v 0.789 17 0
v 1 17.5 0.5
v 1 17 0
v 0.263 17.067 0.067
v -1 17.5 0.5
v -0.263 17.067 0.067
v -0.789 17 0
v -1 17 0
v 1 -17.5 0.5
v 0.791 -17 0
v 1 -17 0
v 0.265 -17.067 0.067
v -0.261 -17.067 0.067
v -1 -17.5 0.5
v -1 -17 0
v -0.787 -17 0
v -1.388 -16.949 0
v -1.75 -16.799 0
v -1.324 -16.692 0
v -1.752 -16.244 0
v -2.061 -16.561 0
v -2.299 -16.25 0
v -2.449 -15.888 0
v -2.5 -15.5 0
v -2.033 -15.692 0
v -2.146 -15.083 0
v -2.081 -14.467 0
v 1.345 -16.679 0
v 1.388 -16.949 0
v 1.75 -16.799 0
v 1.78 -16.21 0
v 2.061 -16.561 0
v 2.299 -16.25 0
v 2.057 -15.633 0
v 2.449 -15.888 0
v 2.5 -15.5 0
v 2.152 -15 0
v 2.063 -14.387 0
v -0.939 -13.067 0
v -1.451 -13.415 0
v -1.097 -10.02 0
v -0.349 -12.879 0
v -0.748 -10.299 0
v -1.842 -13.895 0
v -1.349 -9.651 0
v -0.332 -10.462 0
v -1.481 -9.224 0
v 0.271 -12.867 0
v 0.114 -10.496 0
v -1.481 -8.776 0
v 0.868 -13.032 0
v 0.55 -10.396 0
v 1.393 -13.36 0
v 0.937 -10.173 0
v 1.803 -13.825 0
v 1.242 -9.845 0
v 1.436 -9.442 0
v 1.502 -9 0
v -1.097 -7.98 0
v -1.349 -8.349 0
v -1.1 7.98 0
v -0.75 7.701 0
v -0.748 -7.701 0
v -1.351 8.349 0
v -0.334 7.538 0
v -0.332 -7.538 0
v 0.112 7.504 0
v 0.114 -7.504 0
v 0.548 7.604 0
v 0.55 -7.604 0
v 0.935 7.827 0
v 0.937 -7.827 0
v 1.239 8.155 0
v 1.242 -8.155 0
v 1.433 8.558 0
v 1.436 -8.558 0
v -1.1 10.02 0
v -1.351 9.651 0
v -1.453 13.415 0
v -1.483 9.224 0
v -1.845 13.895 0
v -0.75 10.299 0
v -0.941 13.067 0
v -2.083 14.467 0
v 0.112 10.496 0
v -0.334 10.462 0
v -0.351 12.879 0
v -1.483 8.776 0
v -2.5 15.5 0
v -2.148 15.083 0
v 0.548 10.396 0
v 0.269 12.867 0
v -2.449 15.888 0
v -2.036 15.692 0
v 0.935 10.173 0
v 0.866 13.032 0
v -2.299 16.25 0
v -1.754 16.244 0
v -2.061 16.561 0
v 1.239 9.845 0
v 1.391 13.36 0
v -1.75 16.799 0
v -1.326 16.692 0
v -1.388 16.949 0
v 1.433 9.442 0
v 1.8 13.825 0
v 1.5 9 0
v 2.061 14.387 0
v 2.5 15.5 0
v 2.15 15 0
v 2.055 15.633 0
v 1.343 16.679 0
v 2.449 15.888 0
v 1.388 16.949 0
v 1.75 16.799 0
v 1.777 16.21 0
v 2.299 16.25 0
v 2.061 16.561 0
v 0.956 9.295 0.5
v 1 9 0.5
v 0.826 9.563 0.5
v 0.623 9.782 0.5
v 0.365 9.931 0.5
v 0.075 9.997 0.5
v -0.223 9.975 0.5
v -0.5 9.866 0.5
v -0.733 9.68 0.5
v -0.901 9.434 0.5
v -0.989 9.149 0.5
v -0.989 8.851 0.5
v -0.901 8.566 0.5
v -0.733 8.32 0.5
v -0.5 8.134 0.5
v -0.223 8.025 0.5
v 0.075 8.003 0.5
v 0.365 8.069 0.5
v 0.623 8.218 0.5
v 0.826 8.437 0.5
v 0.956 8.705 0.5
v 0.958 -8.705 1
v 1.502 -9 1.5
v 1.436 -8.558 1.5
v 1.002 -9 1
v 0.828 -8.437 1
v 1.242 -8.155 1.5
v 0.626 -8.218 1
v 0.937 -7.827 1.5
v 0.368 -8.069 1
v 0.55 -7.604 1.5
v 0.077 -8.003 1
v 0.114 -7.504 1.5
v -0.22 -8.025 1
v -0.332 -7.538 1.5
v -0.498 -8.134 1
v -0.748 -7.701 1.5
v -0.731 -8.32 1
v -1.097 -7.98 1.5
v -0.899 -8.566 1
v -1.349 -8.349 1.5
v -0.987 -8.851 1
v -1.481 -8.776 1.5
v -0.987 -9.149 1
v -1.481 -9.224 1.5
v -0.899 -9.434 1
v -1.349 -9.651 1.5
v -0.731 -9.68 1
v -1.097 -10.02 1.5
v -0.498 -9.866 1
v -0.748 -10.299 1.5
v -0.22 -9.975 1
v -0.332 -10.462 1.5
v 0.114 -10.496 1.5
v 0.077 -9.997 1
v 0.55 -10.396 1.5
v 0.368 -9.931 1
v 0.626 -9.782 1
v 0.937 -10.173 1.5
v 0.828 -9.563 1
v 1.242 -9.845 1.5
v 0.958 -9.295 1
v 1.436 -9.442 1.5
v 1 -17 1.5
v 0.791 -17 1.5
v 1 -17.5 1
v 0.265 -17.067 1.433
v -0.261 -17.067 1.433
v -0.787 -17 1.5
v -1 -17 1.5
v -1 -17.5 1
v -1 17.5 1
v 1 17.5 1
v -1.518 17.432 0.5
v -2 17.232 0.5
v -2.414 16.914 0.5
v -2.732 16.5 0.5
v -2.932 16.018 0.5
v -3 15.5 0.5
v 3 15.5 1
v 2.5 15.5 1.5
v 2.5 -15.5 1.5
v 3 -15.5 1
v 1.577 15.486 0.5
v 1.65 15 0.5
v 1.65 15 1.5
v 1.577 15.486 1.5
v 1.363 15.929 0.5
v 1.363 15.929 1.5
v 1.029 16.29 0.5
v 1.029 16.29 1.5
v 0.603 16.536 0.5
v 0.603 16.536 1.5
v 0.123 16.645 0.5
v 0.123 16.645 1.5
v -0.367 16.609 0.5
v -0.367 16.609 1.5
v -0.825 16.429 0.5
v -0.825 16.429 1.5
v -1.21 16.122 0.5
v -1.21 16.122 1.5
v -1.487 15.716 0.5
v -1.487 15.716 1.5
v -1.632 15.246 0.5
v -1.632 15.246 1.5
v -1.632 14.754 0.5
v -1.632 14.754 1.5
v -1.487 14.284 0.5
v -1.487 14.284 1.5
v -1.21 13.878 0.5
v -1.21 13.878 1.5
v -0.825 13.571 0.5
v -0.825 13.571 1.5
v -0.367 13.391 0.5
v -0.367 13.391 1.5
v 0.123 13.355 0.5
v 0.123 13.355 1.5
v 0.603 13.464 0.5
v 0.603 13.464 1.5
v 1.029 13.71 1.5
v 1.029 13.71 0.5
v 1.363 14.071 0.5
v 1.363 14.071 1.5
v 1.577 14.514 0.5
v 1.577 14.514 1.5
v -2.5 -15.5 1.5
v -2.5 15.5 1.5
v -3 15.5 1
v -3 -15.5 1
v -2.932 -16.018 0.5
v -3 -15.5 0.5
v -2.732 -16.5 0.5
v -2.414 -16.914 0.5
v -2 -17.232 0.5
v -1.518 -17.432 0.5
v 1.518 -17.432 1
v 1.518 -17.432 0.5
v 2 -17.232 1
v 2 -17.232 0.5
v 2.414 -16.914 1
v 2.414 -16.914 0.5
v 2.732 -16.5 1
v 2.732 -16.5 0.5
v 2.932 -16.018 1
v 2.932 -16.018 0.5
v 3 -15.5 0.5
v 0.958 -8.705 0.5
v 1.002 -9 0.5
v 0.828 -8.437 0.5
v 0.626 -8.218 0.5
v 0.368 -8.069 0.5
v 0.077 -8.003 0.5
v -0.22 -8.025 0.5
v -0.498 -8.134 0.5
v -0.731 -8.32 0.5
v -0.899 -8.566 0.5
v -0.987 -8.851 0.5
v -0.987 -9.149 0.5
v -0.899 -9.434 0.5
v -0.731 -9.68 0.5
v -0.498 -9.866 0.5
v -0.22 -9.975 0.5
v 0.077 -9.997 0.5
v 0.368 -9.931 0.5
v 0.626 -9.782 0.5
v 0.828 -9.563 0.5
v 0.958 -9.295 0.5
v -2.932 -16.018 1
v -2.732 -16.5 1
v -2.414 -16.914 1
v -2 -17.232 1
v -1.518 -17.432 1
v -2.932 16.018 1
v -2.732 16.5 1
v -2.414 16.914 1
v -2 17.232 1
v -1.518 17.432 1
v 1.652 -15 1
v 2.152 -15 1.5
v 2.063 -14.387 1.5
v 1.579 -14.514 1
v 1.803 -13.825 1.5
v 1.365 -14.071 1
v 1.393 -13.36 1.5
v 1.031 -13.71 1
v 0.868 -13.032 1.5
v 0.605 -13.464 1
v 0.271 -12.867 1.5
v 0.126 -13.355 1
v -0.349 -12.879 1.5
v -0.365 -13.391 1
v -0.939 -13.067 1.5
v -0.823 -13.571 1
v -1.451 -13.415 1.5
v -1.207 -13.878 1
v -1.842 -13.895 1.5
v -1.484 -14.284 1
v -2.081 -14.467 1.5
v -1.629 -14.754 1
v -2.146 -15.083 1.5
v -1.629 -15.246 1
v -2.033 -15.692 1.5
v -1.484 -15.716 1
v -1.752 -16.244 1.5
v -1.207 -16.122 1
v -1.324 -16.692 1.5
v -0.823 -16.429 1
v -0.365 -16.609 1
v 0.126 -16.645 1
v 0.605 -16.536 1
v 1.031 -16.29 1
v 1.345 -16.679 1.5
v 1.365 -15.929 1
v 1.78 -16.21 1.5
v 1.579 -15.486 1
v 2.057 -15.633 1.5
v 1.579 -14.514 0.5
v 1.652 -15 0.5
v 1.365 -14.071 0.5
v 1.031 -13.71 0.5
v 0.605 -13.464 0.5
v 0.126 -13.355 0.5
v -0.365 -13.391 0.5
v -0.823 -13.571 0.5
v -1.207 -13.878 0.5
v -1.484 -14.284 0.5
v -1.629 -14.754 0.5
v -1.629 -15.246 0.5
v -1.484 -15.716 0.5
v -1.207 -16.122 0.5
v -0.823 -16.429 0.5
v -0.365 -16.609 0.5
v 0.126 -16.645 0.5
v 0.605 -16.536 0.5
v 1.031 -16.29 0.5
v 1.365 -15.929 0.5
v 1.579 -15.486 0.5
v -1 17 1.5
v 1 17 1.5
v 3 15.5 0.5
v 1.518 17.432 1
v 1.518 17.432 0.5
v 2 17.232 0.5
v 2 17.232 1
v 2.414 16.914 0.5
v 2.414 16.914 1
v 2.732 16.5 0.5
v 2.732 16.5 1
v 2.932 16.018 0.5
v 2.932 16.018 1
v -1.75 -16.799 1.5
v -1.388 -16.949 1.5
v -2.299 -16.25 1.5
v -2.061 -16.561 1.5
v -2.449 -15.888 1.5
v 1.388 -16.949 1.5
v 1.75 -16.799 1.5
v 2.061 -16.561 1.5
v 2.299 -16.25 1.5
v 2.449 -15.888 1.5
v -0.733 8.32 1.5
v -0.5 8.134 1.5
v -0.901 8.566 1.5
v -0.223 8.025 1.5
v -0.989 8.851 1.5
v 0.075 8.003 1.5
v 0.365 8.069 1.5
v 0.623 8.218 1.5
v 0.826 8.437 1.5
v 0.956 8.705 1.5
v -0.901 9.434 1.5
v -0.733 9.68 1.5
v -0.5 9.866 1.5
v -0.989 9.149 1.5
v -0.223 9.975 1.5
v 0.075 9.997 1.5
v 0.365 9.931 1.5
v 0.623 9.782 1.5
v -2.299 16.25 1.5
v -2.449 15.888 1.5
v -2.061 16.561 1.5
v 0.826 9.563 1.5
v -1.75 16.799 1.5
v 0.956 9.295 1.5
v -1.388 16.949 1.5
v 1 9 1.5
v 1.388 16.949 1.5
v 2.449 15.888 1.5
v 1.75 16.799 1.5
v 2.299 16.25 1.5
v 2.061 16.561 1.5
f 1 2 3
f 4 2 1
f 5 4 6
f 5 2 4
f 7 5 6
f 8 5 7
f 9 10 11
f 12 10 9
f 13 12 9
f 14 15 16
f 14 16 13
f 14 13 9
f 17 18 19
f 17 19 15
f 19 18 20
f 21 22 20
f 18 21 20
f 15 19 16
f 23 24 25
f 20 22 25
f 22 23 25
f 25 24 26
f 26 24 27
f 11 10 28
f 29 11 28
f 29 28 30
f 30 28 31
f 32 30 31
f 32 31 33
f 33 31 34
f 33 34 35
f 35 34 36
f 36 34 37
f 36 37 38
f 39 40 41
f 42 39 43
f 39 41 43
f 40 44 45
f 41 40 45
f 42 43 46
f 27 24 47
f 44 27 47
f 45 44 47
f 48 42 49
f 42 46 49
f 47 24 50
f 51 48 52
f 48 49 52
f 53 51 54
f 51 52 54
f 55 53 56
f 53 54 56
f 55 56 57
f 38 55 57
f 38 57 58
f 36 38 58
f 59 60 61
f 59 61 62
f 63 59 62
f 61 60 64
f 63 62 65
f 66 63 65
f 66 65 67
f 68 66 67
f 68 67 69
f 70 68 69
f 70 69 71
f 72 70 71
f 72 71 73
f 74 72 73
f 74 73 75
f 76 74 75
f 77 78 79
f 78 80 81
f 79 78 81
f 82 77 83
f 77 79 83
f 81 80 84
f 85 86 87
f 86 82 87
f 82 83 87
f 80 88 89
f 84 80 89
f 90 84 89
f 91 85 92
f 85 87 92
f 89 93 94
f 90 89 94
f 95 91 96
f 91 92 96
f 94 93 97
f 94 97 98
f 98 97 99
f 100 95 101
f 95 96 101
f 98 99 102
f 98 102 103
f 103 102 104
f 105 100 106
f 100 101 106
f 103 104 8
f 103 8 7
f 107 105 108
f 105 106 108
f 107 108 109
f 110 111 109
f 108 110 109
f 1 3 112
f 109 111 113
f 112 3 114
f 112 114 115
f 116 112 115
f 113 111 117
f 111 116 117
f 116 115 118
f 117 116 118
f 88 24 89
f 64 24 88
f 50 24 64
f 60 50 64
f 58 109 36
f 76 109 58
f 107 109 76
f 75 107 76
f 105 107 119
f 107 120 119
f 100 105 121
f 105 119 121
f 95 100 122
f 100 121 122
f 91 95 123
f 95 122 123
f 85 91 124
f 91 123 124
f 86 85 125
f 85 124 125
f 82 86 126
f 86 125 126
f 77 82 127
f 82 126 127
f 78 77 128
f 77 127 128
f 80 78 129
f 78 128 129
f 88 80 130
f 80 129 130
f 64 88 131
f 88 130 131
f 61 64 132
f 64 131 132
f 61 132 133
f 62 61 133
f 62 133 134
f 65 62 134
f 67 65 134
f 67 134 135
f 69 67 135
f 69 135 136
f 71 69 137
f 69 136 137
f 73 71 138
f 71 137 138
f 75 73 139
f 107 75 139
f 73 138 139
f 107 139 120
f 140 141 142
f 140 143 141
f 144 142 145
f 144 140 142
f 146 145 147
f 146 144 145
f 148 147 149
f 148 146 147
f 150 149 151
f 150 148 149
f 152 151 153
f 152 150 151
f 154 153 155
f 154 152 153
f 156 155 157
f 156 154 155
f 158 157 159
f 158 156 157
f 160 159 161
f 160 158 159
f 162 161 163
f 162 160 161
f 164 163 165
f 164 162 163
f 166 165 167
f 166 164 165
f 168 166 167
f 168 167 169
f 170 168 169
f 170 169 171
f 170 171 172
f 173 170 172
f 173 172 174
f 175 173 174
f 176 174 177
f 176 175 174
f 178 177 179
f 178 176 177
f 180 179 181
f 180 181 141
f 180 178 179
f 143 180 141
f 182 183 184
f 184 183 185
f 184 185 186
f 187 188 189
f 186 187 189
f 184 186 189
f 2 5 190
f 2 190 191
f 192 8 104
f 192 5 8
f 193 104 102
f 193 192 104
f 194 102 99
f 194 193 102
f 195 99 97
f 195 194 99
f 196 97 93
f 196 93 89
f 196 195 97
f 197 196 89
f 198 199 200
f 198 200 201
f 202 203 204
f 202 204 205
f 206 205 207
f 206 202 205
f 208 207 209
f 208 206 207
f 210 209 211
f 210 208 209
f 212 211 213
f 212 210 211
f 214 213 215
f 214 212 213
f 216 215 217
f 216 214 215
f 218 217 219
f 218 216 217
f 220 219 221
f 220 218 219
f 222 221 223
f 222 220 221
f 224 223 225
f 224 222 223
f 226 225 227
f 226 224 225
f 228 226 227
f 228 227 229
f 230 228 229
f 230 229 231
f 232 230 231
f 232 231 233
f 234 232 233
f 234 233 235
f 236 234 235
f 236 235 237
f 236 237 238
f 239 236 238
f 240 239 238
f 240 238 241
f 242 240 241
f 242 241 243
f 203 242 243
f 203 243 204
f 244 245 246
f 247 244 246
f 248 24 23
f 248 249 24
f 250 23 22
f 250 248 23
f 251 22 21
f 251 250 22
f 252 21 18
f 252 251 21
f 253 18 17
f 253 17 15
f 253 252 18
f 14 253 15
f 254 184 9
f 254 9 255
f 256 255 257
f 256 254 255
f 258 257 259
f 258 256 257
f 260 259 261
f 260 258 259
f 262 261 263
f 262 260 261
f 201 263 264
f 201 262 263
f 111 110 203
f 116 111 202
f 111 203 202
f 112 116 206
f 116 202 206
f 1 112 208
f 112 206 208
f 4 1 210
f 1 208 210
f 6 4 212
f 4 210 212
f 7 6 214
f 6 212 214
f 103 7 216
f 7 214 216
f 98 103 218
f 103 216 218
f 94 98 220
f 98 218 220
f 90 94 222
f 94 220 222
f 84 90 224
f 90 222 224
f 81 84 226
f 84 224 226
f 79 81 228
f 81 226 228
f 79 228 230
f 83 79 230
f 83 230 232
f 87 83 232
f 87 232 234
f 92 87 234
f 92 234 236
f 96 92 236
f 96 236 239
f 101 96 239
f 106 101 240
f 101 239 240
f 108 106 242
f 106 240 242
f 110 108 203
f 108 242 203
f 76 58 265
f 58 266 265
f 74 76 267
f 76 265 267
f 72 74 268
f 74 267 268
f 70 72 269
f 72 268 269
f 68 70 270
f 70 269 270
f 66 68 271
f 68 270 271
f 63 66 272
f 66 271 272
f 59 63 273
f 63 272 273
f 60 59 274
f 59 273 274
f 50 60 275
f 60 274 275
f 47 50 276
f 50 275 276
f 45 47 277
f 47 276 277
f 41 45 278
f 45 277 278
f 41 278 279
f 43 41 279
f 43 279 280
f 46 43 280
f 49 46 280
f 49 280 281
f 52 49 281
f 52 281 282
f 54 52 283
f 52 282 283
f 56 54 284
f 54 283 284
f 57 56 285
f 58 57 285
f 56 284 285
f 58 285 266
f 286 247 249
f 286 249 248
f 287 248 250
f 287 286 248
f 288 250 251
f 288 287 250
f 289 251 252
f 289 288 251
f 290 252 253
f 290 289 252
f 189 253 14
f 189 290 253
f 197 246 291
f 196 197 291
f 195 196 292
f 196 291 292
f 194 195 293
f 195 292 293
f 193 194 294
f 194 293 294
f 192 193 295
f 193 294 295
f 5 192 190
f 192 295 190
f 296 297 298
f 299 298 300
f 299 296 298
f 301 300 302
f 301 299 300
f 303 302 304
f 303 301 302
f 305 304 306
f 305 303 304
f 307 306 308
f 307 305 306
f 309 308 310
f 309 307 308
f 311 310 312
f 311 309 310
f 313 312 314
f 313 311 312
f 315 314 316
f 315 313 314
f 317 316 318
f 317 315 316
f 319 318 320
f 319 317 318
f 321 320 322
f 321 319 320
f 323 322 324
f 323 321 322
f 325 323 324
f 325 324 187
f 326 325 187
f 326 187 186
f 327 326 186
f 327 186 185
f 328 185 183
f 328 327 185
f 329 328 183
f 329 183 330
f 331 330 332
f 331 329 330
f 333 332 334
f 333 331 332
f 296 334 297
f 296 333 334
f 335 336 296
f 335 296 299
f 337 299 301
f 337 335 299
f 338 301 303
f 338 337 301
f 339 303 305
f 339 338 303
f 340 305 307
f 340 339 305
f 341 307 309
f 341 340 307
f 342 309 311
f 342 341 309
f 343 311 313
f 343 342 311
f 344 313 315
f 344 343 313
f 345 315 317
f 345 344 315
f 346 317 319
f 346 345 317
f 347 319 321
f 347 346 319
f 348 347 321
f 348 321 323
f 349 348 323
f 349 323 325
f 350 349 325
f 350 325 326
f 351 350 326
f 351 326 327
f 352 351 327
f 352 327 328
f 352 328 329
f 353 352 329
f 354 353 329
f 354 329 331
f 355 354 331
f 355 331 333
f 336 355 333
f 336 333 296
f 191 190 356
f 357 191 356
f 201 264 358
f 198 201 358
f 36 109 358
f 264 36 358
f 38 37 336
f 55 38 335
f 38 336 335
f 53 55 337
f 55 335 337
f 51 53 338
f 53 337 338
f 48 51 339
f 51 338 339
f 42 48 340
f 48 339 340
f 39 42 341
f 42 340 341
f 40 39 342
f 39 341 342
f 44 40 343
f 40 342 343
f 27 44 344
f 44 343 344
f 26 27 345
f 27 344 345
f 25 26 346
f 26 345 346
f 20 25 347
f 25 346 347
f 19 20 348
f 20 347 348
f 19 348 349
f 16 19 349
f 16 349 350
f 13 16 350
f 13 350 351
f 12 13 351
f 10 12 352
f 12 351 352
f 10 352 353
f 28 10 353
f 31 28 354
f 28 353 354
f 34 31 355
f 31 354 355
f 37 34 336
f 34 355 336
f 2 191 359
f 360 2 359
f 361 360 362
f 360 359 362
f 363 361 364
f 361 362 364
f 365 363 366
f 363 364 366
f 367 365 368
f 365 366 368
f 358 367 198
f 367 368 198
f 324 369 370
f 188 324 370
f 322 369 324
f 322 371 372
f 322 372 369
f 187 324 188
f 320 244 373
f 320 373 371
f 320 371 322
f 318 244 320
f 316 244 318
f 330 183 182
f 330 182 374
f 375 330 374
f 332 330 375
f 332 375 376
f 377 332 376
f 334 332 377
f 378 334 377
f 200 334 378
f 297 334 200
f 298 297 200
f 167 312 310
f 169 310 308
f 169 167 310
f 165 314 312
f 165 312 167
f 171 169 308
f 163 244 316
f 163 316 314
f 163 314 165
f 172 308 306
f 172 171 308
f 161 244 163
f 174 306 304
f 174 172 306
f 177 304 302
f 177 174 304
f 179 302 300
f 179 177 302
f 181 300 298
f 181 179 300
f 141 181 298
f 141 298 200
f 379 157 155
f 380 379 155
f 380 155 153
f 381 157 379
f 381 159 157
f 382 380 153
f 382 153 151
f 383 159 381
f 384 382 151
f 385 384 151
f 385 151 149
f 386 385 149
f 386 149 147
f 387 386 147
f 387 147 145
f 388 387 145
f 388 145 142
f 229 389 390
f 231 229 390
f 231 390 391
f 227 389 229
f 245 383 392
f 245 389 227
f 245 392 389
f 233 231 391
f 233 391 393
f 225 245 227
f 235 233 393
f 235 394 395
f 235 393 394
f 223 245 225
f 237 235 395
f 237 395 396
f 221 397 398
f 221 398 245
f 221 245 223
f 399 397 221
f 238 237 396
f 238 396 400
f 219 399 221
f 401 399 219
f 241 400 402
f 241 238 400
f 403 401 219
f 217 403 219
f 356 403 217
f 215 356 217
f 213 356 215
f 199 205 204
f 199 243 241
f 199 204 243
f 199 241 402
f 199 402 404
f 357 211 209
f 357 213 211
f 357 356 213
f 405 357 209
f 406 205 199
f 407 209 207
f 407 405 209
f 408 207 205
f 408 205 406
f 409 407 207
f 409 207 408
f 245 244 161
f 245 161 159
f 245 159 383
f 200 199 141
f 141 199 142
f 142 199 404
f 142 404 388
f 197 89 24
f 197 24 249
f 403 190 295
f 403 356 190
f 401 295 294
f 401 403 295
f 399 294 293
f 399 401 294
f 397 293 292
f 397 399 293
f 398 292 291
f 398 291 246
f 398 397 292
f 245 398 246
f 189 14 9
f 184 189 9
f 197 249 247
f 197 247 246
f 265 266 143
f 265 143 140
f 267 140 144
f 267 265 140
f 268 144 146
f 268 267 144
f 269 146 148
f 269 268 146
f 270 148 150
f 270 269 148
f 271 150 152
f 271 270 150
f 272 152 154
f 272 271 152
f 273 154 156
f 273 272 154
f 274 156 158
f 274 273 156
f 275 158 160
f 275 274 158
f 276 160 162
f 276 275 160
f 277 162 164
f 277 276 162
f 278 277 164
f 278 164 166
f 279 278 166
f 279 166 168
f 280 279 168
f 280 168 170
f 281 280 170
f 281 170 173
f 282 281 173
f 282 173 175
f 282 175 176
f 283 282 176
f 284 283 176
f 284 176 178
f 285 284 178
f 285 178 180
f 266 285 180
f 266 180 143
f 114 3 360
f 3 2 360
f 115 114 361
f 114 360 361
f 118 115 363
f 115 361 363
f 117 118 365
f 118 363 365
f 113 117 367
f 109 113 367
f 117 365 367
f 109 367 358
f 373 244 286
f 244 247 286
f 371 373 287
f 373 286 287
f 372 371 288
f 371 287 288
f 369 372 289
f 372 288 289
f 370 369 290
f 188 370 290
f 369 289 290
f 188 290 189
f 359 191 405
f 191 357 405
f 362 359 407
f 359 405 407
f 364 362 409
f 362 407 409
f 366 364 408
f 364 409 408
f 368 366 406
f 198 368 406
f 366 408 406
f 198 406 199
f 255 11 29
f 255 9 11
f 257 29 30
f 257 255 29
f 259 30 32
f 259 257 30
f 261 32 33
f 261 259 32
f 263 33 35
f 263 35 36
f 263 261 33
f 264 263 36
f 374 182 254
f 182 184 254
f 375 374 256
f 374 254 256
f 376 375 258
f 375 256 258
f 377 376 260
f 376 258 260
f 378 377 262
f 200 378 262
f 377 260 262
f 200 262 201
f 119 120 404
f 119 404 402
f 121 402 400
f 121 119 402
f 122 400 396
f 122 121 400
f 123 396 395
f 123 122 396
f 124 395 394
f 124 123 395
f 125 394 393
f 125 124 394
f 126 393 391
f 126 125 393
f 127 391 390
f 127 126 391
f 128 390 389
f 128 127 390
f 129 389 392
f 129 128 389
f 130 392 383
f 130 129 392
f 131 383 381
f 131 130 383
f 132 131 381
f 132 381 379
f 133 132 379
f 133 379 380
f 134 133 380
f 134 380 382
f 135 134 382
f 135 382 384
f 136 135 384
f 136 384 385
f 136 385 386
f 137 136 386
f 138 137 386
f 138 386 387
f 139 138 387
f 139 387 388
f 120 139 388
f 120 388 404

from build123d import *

# Parameters (mm, degrees)
F0_W         = 6
F0_H         = 35
F0_R         = 1.65
F0_R_2       = 1
F1_DEPTH     = 1.5
F2_R         = 2
F3_T1_DEPTH  = 31
F3_T3_DEPTH  = 2
F3_T6_ANGLE  = 90
F3_T8_ANGLE  = 90
F3_T10_ANGLE = 90
F3_T12_ANGLE = 90
F3_T14_ANGLE = 90
F3_T16_ANGLE = 90
F3_T18_ANGLE = 90
F3_T20_ANGLE = 90


# Not quite as in the source:
# - a fillet or chamfer that OpenCascade refuses, or shapes differently, is made with other operations: its cross-section is extruded or revolved along the edge and cut away or added


with BuildPart() as f1:
    # F0 (on Top) → F1 (new body)
    with BuildSketch(Plane.XY):
        Rectangle(F0_W, F0_H)
        with Locations((0.0021975506, -14.9999999195)):
            Circle(F0_R, mode=Mode.SUBTRACT)
        with Locations((0.0021975506, -9)):
            Circle(F0_R_2, mode=Mode.SUBTRACT)
        with Locations((0, 9)):
            Circle(F0_R_2, mode=Mode.SUBTRACT)
        with Locations((0, 15)):
            Circle(F0_R, mode=Mode.SUBTRACT)
    extrude(amount=F1_DEPTH)

    # F2
    f2_edges = [f1.edges().sort_by_distance(p)[0] for p in [
        (-3, 17.5, 0.75),
        (3, 17.5, 0.75),
        (-3, -17.5, 0.75),
        (3, -17.5, 0.75),
    ]]
    fillet(f2_edges, radius=F2_R)

    # F3: chamfer of 0.5 on 22 edges, made by hand

    # F3_s2 → F3_t1 (cut)
    with BuildSketch(Plane.XZ.offset(-15.5)):
        Polygon((-2.5, 1.5), (-3, 1), (-3, 1.5), align=None)
        Polygon((2.5, 1.5), (3, 1), (3, 1.5), align=None)
        Polygon((2.5, 0), (3, 0.5), (3, 0), align=None)
        Polygon((-2.5, 0), (-3, 0.5), (-3, 0), align=None)
    extrude(amount=F3_T1_DEPTH, mode=Mode.SUBTRACT)

    # F3_s4 → F3_t3 (cut)
    with BuildSketch(Plane.YZ.offset(-1)):
        Polygon((17.5, 1), (17, 1.5), (17.5, 1.5), align=None)
        Polygon((-17, 1.5), (-17.5, 1), (-17.5, 1.5), align=None)
        Polygon((17.5, 0.5), (17, 0), (17.5, 0), align=None)
        Polygon((-17, 0), (-17.5, 0.5), (-17.5, 0), align=None)
    extrude(amount=F3_T3_DEPTH, mode=Mode.SUBTRACT)

    # F3_s5 → F3_t6 (revolve, cut)
    with BuildSketch(Plane.YZ.offset(1)):
        Polygon((17.5, 1), (17, 1.5), (17.5, 1.5), align=None)
    revolve(axis=Axis((1, 15.5, 1.5), (0, 0, -1)), revolution_arc=F3_T6_ANGLE, mode=Mode.SUBTRACT)

    # F3_s7 → F3_t8 (revolve, cut)
    with BuildSketch(Plane.YZ.offset(-1)):
        Polygon((17.5, 1), (17, 1.5), (17.5, 1.5), align=None)
    revolve(axis=Axis((-1, 15.5, 1.5), (0, 0, 1)), revolution_arc=F3_T8_ANGLE, mode=Mode.SUBTRACT)

    # F3_s9 → F3_t10 (revolve, cut)
    with BuildSketch(Plane.XZ.offset(15.5)):
        Polygon((-2.5, 1.5), (-3, 1), (-3, 1.5), align=None)
    revolve(axis=Axis((-1, -15.5, 1.5), (0, 0, 1)), revolution_arc=F3_T10_ANGLE, mode=Mode.SUBTRACT)

    # F3_s11 → F3_t12 (revolve, cut)
    with BuildSketch(Plane.YZ.offset(1)):
        Polygon((-17, 1.5), (-17.5, 1), (-17.5, 1.5), align=None)
    revolve(axis=Axis((1, -15.5, 1.5), (0, 0, 1)), revolution_arc=F3_T12_ANGLE, mode=Mode.SUBTRACT)

    # F3_s13 → F3_t14 (revolve, cut)
    with BuildSketch(Plane.YZ.offset(-1)):
        Polygon((17, 0), (17.5, 0.5), (17.5, 0), align=None)
    revolve(axis=Axis((-1, 15.5, 0), (0, 0, 1)), revolution_arc=F3_T14_ANGLE, mode=Mode.SUBTRACT)

    # F3_s15 → F3_t16 (revolve, cut)
    with BuildSketch(Plane.YZ.offset(1)):
        Polygon((17, 0), (17.5, 0.5), (17.5, 0), align=None)
    revolve(axis=Axis((1, 15.5, 0), (0, 0, -1)), revolution_arc=F3_T16_ANGLE, mode=Mode.SUBTRACT)

    # F3_s17 → F3_t18 (revolve, cut)
    with BuildSketch(Plane.XZ.offset(15.5)):
        Polygon((-2.5, 0), (-3, 0.5), (-3, 0), align=None)
    revolve(axis=Axis((-1, -15.5, 0), (0, 0, 1)), revolution_arc=F3_T18_ANGLE, mode=Mode.SUBTRACT)

    # F3_s19 → F3_t20 (revolve, cut)
    with BuildSketch(Plane.YZ.offset(1)):
        Polygon((-17, 0), (-17.5, 0.5), (-17.5, 0), align=None)
    revolve(axis=Axis((1, -15.5, 0), (0, 0, 1)), revolution_arc=F3_T20_ANGLE, mode=Mode.SUBTRACT)

    # F3_s21 → F3_t22 (revolve, cut)
    with BuildSketch(Plane.XZ.offset(9)):
        Polygon((1.5021975506, 0), (1.0021975506, 0.5), (1.0021975506, 0), align=None)
    revolve(axis=Axis((0.0021975506, -9, 0), (0, 0, 1)), mode=Mode.SUBTRACT)

    # F3_s23 → F3_t24 (revolve, cut)
    with BuildSketch(Plane.XZ.offset(-9)):
        Polygon((1.5, 0), (1, 0.5), (1, 0), align=None)
    revolve(axis=Axis((0, 9, 0), (0, 0, 1)), mode=Mode.SUBTRACT)

    # F3_s25 → F3_t26 (revolve, cut)
    with BuildSketch(Plane.XZ.offset(-15)):
        Polygon((2.15, 0), (1.65, 0.5), (1.65, 0), align=None)
    revolve(axis=Axis((0, 15, 0), (0, 0, 1)), mode=Mode.SUBTRACT)

    # F3_s27 → F3_t28 (revolve, cut)
    with BuildSketch(Plane.XZ.offset(9)):
        Polygon((1.5021975506, 1.5), (1.0021975506, 1), (1.0021975506, 1.5), align=None)
    revolve(axis=Axis((0.0021975506, -9, 1.5), (0, 0, 1)), mode=Mode.SUBTRACT)

    # F3_s29 → F3_t30 (revolve, cut)
    with BuildSketch(Plane.XZ.offset(14.9999999195)):
        Polygon((2.1521975506, 1.5), (1.6521975506, 1), (1.6521975506, 1.5), align=None)
    revolve(axis=Axis((0.0021975506, -14.9999999195, 1.5), (0, 0, 1)), mode=Mode.SUBTRACT)

    # F3_s31 → F3_t32 (revolve, cut)
    with BuildSketch(Plane.XZ.offset(14.9999999195)):
        Polygon((2.1521975506, 0), (1.6521975506, 0.5), (1.6521975506, 0), align=None)
    revolve(axis=Axis((0.0021975506, -14.9999999195, 0), (0, 0, 1)), mode=Mode.SUBTRACT)


solid = f1.part
